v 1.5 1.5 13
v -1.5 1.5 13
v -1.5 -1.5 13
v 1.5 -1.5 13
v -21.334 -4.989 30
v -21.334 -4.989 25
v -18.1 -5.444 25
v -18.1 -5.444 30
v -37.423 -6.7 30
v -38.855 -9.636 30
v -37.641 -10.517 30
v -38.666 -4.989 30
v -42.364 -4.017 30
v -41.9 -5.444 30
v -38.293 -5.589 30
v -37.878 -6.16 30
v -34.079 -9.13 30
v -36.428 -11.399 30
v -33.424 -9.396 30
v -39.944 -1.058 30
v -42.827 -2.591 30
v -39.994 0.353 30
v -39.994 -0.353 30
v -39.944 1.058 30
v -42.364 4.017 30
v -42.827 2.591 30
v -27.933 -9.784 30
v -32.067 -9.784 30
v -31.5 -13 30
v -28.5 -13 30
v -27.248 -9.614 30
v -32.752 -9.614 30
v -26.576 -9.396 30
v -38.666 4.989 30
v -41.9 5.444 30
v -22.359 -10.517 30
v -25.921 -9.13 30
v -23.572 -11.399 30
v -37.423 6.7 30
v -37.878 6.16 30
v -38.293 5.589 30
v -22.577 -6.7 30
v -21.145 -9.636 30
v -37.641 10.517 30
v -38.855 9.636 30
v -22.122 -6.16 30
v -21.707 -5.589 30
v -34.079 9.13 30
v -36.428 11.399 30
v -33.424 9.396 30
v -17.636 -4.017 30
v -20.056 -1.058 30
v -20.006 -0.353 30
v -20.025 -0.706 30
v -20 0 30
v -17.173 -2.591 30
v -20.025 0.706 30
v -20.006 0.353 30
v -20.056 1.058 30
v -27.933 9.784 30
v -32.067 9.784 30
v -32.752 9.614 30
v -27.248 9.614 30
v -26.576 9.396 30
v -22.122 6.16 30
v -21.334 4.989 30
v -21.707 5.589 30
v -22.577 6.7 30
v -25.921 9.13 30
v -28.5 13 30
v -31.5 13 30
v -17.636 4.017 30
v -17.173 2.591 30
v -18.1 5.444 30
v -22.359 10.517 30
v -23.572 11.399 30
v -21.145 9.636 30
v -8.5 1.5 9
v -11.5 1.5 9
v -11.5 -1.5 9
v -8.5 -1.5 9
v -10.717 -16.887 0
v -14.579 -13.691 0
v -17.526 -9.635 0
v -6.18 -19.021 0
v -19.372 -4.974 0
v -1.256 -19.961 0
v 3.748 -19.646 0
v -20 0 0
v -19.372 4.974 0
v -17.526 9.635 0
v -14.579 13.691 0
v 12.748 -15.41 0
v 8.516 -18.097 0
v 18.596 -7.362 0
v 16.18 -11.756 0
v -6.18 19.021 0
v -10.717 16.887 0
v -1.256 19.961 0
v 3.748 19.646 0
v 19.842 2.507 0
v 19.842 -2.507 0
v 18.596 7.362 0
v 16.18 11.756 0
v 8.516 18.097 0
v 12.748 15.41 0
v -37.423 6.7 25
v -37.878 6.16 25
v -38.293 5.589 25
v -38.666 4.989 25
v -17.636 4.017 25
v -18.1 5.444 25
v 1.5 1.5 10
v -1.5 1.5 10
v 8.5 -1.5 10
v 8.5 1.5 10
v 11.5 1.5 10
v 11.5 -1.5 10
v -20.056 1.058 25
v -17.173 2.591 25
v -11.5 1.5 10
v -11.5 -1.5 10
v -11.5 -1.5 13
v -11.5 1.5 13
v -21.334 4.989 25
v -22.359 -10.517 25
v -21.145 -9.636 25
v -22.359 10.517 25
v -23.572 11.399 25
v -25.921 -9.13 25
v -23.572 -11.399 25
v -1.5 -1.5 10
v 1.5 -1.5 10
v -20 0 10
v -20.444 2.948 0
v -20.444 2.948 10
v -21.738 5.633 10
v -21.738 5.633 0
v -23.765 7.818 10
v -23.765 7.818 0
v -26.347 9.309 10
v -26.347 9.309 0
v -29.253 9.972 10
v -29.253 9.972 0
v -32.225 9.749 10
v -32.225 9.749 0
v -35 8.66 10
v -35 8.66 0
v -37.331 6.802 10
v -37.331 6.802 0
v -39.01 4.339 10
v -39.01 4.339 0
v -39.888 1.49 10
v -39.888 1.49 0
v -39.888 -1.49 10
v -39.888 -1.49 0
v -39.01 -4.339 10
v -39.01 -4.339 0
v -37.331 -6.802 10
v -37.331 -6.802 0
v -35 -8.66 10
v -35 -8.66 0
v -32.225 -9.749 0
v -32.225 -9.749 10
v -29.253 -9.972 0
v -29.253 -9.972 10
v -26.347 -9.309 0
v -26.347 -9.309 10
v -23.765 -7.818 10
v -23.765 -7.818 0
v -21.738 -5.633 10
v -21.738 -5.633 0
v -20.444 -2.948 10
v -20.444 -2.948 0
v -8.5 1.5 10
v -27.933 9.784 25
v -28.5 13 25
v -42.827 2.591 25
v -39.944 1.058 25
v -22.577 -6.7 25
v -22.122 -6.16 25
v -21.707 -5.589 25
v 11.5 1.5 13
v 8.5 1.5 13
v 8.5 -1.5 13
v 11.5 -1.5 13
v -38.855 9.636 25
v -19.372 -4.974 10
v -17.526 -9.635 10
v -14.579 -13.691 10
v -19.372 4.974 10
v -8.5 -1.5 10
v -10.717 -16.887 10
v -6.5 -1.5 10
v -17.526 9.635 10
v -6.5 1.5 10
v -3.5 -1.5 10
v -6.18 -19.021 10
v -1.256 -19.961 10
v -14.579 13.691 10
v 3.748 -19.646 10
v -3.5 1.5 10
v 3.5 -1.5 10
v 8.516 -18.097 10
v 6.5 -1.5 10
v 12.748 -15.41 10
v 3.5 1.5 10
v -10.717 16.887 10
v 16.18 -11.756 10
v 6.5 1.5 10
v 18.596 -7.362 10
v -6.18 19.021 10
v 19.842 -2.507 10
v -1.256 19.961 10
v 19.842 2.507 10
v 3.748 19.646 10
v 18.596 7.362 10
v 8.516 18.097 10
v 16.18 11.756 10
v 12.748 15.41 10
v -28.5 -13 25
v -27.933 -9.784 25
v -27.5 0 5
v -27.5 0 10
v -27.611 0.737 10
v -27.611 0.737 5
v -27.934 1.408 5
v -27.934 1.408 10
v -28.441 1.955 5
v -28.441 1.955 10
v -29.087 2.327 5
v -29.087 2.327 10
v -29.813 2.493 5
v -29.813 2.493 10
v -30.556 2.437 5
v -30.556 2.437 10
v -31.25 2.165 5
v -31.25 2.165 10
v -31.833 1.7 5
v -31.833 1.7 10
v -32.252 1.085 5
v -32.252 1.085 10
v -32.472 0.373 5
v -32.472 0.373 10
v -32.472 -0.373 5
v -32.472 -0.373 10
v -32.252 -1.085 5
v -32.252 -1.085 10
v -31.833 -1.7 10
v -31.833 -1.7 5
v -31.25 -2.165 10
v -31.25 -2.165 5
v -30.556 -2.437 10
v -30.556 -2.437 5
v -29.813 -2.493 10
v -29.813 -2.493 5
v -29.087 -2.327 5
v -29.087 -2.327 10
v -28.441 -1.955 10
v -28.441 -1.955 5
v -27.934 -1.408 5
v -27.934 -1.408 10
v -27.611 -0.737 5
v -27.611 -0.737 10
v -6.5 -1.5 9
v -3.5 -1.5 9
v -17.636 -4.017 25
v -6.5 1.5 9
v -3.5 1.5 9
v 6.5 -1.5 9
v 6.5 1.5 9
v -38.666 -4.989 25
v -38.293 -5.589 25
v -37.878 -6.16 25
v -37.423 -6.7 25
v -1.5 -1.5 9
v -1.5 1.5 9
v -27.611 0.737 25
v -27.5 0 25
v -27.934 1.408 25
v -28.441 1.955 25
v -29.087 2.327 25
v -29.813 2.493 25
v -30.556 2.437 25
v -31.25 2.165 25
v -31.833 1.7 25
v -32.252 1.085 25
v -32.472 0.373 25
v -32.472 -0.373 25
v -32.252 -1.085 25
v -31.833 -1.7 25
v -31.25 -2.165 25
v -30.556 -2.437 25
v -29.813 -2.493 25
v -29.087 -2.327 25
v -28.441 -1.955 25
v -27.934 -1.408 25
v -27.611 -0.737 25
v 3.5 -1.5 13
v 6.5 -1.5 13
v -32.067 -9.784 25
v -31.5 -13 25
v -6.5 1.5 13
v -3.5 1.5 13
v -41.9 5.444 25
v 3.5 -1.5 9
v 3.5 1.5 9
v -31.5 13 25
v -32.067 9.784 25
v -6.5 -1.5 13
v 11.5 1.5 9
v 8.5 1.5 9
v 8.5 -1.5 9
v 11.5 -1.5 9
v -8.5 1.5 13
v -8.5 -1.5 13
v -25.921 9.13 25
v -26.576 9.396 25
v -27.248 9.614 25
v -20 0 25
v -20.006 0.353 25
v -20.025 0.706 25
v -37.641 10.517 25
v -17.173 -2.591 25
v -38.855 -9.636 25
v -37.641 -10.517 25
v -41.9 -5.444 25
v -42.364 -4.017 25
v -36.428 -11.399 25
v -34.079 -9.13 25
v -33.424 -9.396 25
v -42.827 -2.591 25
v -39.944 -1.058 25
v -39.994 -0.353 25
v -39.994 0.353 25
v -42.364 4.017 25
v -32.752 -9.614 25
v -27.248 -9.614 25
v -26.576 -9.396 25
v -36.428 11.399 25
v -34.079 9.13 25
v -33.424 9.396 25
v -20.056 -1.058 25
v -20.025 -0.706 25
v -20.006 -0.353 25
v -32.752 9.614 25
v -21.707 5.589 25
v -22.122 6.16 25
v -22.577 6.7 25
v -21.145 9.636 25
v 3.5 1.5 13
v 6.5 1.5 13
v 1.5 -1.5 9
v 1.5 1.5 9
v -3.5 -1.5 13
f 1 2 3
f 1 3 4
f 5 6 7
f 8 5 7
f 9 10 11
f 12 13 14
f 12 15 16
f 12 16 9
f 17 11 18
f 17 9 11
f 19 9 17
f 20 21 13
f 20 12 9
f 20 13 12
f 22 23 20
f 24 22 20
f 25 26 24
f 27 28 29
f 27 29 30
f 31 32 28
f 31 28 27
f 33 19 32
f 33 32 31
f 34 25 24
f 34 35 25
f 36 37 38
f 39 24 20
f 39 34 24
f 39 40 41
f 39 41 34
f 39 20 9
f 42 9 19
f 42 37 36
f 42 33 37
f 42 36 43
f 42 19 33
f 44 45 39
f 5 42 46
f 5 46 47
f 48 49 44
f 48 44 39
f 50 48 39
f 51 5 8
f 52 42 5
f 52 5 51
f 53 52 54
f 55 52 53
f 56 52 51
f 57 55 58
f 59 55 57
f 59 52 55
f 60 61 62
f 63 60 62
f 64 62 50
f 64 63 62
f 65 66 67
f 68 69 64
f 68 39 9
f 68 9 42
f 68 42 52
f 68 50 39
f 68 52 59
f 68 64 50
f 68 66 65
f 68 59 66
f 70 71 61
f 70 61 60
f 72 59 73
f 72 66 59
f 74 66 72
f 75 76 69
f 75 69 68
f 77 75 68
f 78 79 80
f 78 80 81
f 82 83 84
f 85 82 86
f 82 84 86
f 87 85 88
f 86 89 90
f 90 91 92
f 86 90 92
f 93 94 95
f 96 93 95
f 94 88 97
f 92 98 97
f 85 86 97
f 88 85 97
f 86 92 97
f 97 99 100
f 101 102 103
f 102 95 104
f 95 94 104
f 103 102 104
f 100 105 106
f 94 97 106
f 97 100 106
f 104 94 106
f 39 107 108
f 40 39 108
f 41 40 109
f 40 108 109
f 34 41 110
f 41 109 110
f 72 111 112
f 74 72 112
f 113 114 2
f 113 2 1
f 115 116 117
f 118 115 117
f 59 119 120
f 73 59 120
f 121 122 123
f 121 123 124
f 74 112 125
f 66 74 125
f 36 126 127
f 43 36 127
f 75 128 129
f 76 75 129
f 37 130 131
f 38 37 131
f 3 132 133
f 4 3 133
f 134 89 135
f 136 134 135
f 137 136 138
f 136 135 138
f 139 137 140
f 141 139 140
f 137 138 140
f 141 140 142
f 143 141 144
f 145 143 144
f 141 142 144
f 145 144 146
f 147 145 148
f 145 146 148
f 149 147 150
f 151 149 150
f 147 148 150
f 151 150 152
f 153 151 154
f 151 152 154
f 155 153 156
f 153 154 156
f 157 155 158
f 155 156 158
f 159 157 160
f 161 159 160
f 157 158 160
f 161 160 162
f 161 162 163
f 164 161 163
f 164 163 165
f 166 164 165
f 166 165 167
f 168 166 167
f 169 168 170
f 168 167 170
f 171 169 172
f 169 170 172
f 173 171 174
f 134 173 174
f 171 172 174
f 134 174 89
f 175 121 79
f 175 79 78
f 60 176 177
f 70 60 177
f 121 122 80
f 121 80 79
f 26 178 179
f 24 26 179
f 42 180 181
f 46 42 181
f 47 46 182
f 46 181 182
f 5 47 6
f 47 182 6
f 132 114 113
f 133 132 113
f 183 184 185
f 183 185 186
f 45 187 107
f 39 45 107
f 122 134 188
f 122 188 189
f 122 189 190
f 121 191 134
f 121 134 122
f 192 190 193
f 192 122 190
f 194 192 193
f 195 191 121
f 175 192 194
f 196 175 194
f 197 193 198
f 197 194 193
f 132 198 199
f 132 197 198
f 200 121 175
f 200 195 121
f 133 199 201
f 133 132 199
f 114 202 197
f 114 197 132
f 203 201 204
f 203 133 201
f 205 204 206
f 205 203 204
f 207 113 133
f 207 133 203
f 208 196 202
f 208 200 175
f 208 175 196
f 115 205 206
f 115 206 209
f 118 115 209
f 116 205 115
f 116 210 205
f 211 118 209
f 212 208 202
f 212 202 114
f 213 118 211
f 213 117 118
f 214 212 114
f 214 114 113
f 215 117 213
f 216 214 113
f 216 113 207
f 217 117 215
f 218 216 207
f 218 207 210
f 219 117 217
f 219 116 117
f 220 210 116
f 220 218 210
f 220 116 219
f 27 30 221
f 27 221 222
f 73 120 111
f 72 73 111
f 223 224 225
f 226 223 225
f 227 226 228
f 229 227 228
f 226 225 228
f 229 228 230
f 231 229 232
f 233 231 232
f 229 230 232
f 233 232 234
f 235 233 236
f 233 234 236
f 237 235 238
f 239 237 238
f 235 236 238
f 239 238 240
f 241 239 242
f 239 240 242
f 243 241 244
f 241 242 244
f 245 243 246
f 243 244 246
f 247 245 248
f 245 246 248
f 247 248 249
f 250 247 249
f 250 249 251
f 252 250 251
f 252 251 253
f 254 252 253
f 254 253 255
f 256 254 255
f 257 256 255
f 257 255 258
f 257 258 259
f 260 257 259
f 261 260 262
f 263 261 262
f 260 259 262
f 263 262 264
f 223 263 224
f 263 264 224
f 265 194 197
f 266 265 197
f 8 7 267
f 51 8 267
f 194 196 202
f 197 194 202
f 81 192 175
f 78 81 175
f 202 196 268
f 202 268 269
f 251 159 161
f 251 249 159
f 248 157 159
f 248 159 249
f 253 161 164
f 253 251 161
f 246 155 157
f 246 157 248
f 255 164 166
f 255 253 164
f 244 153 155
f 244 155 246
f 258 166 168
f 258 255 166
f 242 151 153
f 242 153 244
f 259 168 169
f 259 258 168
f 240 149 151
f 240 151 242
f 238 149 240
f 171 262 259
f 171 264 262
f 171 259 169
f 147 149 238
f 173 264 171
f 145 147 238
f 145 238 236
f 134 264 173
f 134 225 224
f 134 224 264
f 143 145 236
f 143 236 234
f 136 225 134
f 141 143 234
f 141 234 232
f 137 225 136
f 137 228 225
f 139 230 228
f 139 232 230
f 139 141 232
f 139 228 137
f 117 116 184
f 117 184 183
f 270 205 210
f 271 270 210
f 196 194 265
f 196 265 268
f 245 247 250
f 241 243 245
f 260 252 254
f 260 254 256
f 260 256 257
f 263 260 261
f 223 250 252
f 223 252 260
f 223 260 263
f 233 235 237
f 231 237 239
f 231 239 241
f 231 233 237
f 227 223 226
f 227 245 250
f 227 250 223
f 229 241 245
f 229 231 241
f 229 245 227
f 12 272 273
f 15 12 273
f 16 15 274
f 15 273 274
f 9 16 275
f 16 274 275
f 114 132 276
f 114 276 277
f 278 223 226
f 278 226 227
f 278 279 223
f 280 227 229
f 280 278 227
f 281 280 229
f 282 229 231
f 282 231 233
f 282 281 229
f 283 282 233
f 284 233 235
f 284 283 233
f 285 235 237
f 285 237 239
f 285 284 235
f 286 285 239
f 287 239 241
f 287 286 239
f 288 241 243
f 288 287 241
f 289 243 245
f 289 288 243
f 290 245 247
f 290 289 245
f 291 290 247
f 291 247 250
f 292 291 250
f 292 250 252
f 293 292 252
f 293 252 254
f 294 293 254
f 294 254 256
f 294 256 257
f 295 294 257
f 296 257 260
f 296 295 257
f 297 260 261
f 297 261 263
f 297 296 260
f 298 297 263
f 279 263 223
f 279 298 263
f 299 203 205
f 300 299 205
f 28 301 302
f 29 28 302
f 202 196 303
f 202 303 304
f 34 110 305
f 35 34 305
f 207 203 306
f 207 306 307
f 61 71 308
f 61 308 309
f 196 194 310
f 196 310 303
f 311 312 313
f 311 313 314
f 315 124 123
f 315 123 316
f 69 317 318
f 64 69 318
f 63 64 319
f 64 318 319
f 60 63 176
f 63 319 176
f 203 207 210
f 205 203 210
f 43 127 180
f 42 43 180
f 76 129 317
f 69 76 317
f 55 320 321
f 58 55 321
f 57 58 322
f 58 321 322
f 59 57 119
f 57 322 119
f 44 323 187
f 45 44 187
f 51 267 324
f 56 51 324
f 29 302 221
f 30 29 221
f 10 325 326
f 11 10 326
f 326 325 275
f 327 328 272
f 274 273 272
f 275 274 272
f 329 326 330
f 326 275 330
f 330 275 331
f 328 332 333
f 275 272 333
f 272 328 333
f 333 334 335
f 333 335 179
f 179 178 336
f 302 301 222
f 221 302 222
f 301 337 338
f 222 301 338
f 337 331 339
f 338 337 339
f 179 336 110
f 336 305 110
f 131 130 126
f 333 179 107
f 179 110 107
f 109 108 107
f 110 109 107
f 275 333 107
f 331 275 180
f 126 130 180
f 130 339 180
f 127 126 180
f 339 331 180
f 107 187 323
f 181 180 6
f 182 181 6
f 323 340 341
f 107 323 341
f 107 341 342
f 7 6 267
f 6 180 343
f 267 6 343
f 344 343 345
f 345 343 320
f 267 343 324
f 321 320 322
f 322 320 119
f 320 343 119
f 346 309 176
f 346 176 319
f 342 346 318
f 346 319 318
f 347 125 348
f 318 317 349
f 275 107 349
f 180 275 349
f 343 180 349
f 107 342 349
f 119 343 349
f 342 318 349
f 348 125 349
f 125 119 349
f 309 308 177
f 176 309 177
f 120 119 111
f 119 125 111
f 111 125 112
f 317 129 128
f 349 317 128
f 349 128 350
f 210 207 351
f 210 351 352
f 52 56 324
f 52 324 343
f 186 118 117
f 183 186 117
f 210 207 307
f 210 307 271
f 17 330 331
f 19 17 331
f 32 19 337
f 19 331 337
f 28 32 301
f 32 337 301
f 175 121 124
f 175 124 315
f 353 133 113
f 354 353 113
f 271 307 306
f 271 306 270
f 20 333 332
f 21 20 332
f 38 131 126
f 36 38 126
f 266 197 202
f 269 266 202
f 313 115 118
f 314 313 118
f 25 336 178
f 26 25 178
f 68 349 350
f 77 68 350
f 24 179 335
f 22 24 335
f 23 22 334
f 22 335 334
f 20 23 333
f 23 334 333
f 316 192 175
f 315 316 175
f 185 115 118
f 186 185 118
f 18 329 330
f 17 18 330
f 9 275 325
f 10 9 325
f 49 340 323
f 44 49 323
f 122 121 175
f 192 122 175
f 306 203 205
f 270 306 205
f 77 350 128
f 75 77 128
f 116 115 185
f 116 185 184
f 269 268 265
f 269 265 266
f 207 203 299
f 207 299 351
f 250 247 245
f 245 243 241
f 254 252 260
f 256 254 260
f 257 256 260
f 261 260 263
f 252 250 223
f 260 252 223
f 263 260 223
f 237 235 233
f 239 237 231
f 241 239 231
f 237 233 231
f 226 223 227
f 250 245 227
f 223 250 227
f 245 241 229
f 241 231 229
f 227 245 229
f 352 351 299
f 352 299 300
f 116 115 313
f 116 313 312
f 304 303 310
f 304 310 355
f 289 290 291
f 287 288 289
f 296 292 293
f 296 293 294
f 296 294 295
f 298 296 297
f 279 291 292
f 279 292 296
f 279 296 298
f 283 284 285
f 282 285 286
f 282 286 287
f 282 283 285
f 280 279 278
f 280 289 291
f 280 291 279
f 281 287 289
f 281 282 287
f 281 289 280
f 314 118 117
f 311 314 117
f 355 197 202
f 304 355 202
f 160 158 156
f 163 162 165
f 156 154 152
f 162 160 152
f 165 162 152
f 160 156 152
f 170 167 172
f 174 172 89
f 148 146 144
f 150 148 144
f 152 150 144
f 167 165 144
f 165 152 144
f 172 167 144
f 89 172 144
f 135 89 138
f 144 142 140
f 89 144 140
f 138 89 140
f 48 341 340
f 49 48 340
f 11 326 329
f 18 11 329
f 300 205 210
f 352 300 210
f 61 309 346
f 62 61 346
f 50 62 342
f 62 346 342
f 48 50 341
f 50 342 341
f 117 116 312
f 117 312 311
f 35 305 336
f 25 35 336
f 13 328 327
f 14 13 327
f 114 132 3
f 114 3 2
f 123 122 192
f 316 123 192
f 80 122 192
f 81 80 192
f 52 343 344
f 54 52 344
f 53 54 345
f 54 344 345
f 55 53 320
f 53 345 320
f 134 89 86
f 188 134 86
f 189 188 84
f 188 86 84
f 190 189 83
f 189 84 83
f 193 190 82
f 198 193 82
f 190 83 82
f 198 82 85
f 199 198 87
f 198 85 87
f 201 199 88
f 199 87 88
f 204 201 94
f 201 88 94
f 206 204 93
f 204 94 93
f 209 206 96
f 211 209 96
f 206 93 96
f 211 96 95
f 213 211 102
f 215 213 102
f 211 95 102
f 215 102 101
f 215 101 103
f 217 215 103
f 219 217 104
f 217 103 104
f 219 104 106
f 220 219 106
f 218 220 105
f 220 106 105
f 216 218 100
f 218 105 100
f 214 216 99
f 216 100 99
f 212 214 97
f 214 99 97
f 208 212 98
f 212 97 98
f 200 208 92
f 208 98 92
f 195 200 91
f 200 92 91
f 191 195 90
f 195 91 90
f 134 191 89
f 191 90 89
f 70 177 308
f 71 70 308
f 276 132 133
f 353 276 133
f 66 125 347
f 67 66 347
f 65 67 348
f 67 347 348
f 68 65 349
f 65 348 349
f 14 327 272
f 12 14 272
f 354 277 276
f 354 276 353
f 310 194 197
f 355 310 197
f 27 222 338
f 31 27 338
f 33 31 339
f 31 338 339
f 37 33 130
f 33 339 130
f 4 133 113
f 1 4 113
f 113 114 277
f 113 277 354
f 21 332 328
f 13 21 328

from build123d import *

# Parameters (mm, degrees)
F0_R          = 10
F1_DEPTH      = 10
F2_R          = 2.5
F3_DEPTH      = 15
F3_DEPTH_BACK = 5
F5_DEPTH      = 5
F7_W          = 3
F7_H          = 3
F8_DEPTH      = 1
F9_DEPTH      = 3


with BuildPart() as f1:
    # F0 (on Top) → F1 (new body)
    with BuildSketch(Plane.XY):
        with BuildLine():
            ThreePointArc((-20, 0), (0, -20), (20, 0))
            ThreePointArc((20, 0), (0, 20), (-20, 0))
        make_face()
        with Locations((-30, 0)):
            Circle(F0_R)
    extrude(amount=F1_DEPTH)


with BuildPart() as f3:
    # F2 (on face) → F3 (new body, two sides)
    with BuildSketch(Plane.XY.offset(10)) as f3_sk:
        with Locations((-30, 0)):
            Circle(F2_R)
    extrude(amount=F3_DEPTH)
    extrude(f3_sk.sketch, amount=-F3_DEPTH_BACK)


with BuildPart() as f5:
    # F4 (on face) → F5 (new body)
    with BuildSketch(Plane.XY.offset(25)):
        with BuildLine():
            ThreePointArc((-20.056077, -1.057539), (-20.014029, -0.529512), (-20, 0))
            ThreePointArc((-20, 0), (-20.014029, 0.529512), (-20.056077, 1.057539))
            ThreePointArc((-20.056077, 1.057539), (-20.489435, 3.09017), (-21.333591, 4.989325))
            ThreePointArc((-21.333591, 4.989325), (-21.90983, 5.877853), (-22.576803, 6.700458))
            ThreePointArc((-22.576803, 6.700458), (-24.122147, 8.09017), (-25.92138, 9.130436))
            ThreePointArc((-25.92138, 9.130436), (-26.90983, 9.510565), (-27.932938, 9.784031))
            ThreePointArc((-27.932938, 9.784031), (-30, 10), (-32.067062, 9.784031))
            ThreePointArc((-32.067062, 9.784031), (-33.09017, 9.510565), (-34.07862, 9.130436))
            ThreePointArc((-34.07862, 9.130436), (-35.877853, 8.09017), (-37.423197, 6.700458))
            ThreePointArc((-37.423197, 6.700458), (-38.09017, 5.877853), (-38.666409, 4.989325))
            ThreePointArc((-38.666409, 4.989325), (-39.510565, 3.09017), (-39.943923, 1.057539))
            ThreePointArc((-39.943923, 1.057539), (-40, 0), (-39.943923, -1.057539))
            ThreePointArc((-39.943923, -1.057539), (-39.510565, -3.09017), (-38.666409, -4.989325))
            ThreePointArc((-38.666409, -4.989325), (-38.09017, -5.877853), (-37.423197, -6.700458))
            ThreePointArc((-37.423197, -6.700458), (-35.877853, -8.09017), (-34.07862, -9.130436))
            ThreePointArc((-34.07862, -9.130436), (-33.09017, -9.510565), (-32.067062, -9.784031))
            ThreePointArc((-32.067062, -9.784031), (-30, -10), (-27.932938, -9.784031))
            ThreePointArc((-27.932938, -9.784031), (-26.90983, -9.510565), (-25.92138, -9.130436))
            ThreePointArc((-25.92138, -9.130436), (-24.122147, -8.09017), (-22.576803, -6.700458))
            ThreePointArc((-22.576803, -6.700458), (-21.90983, -5.877853), (-21.333591, -4.989325))
            ThreePointArc((-21.333591, -4.989325), (-20.489435, -3.09017), (-20.056077, -1.057539))
        make_face()
        with BuildLine():
            ThreePointArc((-21.333591, 4.989325), (-20.489435, 3.09017), (-20.056077, 1.057539))
            Line((-20.056077, 1.057539), (-17.17274, 2.590636))
            Line((-17.17274, 2.590636), (-17.636265, 4.017221))
            Line((-17.636265, 4.017221), (-18.099791, 5.443806))
            Line((-18.099791, 5.443806), (-21.333591, 4.989325))
        make_face()
        with BuildLine():
            Line((-17.17274, -2.590636), (-20.056077, -1.057539))
            ThreePointArc((-20.056077, -1.057539), (-20.489435, -3.09017), (-21.333591, -4.989325))
            Line((-21.333591, -4.989325), (-18.099791, -5.443806))
            Line((-18.099791, -5.443806), (-17.636265, -4.017221))
            Line((-17.636265, -4.017221), (-17.17274, -2.590636))
        make_face()
        with BuildLine():
            ThreePointArc((-25.92138, 9.130436), (-24.122147, 8.09017), (-22.576803, 6.700458))
            Line((-22.576803, 6.700458), (-21.145266, 9.635543))
            Line((-21.145266, 9.635543), (-22.358792, 10.517221))
            Line((-22.358792, 10.517221), (-23.572317, 11.398899))
            Line((-23.572317, 11.398899), (-25.92138, 9.130436))
        make_face()
        with BuildLine():
            Line((-21.145266, -9.635543), (-22.576803, -6.700458))
            ThreePointArc((-22.576803, -6.700458), (-24.122147, -8.09017), (-25.92138, -9.130436))
            Line((-25.92138, -9.130436), (-23.572317, -11.398899))
            Line((-23.572317, -11.398899), (-22.358792, -10.517221))
            Line((-22.358792, -10.517221), (-21.145266, -9.635543))
        make_face()
        with BuildLine():
            ThreePointArc((-32.067062, 9.784031), (-30, 10), (-27.932938, 9.784031))
            Line((-27.932938, 9.784031), (-28.5, 13))
            Line((-28.5, 13), (-30, 13))
            Line((-30, 13), (-31.5, 13))
            Line((-31.5, 13), (-32.067062, 9.784031))
        make_face()
        with BuildLine():
            Line((-28.5, -13), (-27.932938, -9.784031))
            ThreePointArc((-27.932938, -9.784031), (-30, -10), (-32.067062, -9.784031))
            Line((-32.067062, -9.784031), (-31.5, -13))
            Line((-31.5, -13), (-30, -13))
            Line((-30, -13), (-28.5, -13))
        make_face()
        with BuildLine():
            ThreePointArc((-37.423197, 6.700458), (-35.877853, 8.09017), (-34.07862, 9.130436))
            Line((-34.07862, 9.130436), (-36.427683, 11.398899))
            Line((-36.427683, 11.398899), (-37.641208, 10.517221))
            Line((-37.641208, 10.517221), (-38.854734, 9.635543))
            Line((-38.854734, 9.635543), (-37.423197, 6.700458))
        make_face()
        with BuildLine():
            Line((-36.427683, -11.398899), (-34.07862, -9.130436))
            ThreePointArc((-34.07862, -9.130436), (-35.877853, -8.09017), (-37.423197, -6.700458))
            Line((-37.423197, -6.700458), (-38.854734, -9.635543))
            Line((-38.854734, -9.635543), (-37.641208, -10.517221))
            Line((-37.641208, -10.517221), (-36.427683, -11.398899))
        make_face()
        with BuildLine():
            ThreePointArc((-39.943923, 1.057539), (-39.510565, 3.09017), (-38.666409, 4.989325))
            Line((-38.666409, 4.989325), (-41.900209, 5.443806))
            Line((-41.900209, 5.443806), (-42.363735, 4.017221))
            Line((-42.363735, 4.017221), (-42.82726, 2.590636))
            Line((-42.82726, 2.590636), (-39.943923, 1.057539))
        make_face()
        with BuildLine():
            Line((-41.900209, -5.443806), (-38.666409, -4.989325))
            ThreePointArc((-38.666409, -4.989325), (-39.510565, -3.09017), (-39.943923, -1.057539))
            Line((-39.943923, -1.057539), (-42.82726, -2.590636))
            Line((-42.82726, -2.590636), (-42.363735, -4.017221))
            Line((-42.363735, -4.017221), (-41.900209, -5.443806))
        make_face()
    extrude(amount=F5_DEPTH)


with BuildPart() as f1_1:
    add(f1.part)

    # F6: cut F3
    add(f3.part, mode=Mode.SUBTRACT)

    # F7 (on face) → F8 (cut)
    with BuildSketch(Plane.XY.offset(10)):
        Rectangle(F7_W, F7_H)
        with Locations((5, 0)):
            Rectangle(F7_W, F7_H)
        with Locations((10, 0)):
            Rectangle(F7_W, F7_H)
        with Locations((-5, 0)):
            Rectangle(F7_W, F7_H)
        with Locations((-10, 0)):
            Rectangle(F7_W, F7_H)
    extrude(amount=-F8_DEPTH, mode=Mode.SUBTRACT)


with BuildPart() as f9:
    # F7 (on face) → F9 (new body)
    with BuildSketch(Plane.XY.offset(10)):
        Rectangle(F7_W, F7_H)
        with Locations((5, 0)):
            Rectangle(F7_W, F7_H)
        with Locations((10, 0)):
            Rectangle(F7_W, F7_H)
        with Locations((-5, 0)):
            Rectangle(F7_W, F7_H)
        with Locations((-10, 0)):
            Rectangle(F7_W, F7_H)
    extrude(amount=F9_DEPTH)


solid = Compound([f3.part, f5.part, f1_1.part, f9.part])
